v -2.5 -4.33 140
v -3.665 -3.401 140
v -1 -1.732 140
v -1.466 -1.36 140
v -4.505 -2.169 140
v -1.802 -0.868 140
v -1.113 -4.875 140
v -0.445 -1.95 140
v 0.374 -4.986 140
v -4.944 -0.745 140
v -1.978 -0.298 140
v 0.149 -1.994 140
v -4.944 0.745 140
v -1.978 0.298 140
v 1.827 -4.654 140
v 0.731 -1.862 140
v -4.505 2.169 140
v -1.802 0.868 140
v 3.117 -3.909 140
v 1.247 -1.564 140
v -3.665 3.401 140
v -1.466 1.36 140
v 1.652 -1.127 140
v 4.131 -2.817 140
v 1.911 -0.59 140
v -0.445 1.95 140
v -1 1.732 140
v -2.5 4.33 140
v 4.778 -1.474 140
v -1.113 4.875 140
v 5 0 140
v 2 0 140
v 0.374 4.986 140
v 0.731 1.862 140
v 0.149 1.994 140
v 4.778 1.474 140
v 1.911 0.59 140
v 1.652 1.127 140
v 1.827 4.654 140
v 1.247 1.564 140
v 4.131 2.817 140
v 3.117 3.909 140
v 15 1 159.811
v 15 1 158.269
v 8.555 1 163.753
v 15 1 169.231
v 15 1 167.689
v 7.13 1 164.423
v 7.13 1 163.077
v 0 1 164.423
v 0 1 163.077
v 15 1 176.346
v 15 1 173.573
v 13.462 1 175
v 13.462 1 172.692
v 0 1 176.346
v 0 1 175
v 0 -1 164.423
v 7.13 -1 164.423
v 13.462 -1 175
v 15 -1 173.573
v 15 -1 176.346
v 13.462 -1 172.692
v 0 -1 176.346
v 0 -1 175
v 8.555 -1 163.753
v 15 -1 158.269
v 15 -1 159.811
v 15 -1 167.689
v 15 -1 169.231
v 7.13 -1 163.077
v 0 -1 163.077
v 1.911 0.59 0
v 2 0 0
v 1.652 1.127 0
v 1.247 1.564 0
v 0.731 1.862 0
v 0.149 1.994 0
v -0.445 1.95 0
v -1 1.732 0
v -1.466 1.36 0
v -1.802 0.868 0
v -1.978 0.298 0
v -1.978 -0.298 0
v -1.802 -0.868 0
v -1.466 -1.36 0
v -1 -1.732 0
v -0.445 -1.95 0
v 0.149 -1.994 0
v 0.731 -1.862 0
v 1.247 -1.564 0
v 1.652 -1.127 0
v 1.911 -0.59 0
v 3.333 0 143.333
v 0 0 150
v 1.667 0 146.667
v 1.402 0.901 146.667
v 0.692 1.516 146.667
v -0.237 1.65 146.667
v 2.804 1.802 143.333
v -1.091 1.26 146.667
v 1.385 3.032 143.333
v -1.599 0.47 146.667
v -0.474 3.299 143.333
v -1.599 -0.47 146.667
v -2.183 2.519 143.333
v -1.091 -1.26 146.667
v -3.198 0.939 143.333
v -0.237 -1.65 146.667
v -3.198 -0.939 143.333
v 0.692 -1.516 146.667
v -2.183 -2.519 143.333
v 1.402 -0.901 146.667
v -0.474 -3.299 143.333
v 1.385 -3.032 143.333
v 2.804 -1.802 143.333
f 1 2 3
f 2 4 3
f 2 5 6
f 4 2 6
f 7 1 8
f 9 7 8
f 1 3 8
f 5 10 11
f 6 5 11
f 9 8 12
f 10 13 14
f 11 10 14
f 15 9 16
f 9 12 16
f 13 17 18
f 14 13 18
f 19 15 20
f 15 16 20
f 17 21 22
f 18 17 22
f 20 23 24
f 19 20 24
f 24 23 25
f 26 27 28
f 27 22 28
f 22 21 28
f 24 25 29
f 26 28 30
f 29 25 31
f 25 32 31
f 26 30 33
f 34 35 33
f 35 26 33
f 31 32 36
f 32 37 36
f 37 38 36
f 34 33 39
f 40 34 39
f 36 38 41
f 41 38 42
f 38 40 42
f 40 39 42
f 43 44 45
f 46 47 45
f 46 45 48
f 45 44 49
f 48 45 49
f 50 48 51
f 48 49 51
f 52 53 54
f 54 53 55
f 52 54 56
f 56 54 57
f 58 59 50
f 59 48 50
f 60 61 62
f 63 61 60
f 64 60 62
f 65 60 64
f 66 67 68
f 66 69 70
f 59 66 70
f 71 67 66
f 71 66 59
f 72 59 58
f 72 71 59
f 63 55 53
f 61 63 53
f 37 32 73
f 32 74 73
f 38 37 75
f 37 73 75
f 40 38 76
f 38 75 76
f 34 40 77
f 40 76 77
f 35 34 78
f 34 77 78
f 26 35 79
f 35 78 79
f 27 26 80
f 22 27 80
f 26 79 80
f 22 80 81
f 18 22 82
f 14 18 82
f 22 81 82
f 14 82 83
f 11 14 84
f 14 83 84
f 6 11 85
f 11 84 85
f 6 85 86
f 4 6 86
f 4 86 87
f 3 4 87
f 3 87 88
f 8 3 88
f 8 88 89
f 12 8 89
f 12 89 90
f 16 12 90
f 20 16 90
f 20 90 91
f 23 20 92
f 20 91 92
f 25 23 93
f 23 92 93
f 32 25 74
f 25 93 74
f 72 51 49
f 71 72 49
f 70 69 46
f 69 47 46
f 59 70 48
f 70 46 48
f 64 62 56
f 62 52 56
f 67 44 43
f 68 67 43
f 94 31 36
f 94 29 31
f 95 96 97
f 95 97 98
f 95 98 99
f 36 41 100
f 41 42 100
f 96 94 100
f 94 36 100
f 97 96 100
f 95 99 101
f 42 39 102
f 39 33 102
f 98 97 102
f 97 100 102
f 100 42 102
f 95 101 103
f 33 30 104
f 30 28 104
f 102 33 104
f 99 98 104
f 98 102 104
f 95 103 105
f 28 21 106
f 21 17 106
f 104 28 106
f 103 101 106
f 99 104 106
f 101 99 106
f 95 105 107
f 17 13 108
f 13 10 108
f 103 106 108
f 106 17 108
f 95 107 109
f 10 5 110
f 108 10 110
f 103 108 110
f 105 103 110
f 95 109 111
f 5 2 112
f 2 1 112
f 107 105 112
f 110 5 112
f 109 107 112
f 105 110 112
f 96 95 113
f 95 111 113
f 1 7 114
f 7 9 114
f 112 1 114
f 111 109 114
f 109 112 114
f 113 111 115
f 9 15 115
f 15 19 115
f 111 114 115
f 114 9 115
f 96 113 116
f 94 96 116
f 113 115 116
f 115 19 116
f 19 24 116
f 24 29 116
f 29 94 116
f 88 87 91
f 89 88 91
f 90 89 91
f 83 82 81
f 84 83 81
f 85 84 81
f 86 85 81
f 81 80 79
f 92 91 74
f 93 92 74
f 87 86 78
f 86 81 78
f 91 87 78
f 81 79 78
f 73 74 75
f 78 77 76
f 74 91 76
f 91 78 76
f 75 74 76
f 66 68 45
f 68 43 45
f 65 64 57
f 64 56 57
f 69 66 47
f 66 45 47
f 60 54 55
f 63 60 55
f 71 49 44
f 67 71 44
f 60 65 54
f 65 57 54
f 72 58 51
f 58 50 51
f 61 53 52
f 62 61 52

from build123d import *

# Parameters (mm, degrees)
BOSS_EXTRUDE1_DEPTH        = 1
BOSS_EXTRUDE1_DEPTH_BACK   = 1
BOSS_EXTRUDE1_2_DEPTH      = 1
BOSS_EXTRUDE1_2_DEPTH_BACK = 1


with BuildPart() as part:
    # Sketch2 → Revolve1 (revolve)
    with BuildSketch(Plane(origin=(0, 0, 0), x_dir=(1, 0, 0), z_dir=(0, 1, 0))):
        Polygon((0, -150), (5, -140), (2, -140), (2, 0), (0, 0), align=None)
    revolve(axis=Axis((0, 0, -41.949952025), (0, 0, 1)))


with BuildPart() as body_2:
    # Sketch3 → Boss-Extrude1 (new, two sides: drawn at the far end of the back side and taken through both)
    with BuildSketch(Plane(origin=(0, 0, 0), x_dir=(1, 0, 0), z_dir=(0, 1, 0)).offset(-BOSS_EXTRUDE1_DEPTH_BACK)):
        Polygon((15, -158.269230769), (15, -159.810697115), (8.5546875, -163.753004808), (15, -167.689302885), (15, -169.230769231), (7.130408654, -164.423076923), (0, -164.423076923), (0, -163.076923077), (7.130408654, -163.076923077), align=None)
    extrude(amount=BOSS_EXTRUDE1_DEPTH + BOSS_EXTRUDE1_DEPTH_BACK)


with BuildPart() as body_3:
    # Sketch3 → Boss-Extrude1 2 (new, two sides: drawn at the far end of the back side and taken through both)
    with BuildSketch(Plane(origin=(0, 0, 0), x_dir=(1, 0, 0), z_dir=(0, 1, 0)).offset(-BOSS_EXTRUDE1_2_DEPTH_BACK)):
        Polygon((15, -173.572716346), (15, -176.346153846), (0, -176.346153846), (0, -175), (13.461538462, -175), (13.461538462, -172.692307692), align=None)
    extrude(amount=BOSS_EXTRUDE1_2_DEPTH + BOSS_EXTRUDE1_2_DEPTH_BACK)


solid = Compound([part.part, body_2.part, body_3.part])
